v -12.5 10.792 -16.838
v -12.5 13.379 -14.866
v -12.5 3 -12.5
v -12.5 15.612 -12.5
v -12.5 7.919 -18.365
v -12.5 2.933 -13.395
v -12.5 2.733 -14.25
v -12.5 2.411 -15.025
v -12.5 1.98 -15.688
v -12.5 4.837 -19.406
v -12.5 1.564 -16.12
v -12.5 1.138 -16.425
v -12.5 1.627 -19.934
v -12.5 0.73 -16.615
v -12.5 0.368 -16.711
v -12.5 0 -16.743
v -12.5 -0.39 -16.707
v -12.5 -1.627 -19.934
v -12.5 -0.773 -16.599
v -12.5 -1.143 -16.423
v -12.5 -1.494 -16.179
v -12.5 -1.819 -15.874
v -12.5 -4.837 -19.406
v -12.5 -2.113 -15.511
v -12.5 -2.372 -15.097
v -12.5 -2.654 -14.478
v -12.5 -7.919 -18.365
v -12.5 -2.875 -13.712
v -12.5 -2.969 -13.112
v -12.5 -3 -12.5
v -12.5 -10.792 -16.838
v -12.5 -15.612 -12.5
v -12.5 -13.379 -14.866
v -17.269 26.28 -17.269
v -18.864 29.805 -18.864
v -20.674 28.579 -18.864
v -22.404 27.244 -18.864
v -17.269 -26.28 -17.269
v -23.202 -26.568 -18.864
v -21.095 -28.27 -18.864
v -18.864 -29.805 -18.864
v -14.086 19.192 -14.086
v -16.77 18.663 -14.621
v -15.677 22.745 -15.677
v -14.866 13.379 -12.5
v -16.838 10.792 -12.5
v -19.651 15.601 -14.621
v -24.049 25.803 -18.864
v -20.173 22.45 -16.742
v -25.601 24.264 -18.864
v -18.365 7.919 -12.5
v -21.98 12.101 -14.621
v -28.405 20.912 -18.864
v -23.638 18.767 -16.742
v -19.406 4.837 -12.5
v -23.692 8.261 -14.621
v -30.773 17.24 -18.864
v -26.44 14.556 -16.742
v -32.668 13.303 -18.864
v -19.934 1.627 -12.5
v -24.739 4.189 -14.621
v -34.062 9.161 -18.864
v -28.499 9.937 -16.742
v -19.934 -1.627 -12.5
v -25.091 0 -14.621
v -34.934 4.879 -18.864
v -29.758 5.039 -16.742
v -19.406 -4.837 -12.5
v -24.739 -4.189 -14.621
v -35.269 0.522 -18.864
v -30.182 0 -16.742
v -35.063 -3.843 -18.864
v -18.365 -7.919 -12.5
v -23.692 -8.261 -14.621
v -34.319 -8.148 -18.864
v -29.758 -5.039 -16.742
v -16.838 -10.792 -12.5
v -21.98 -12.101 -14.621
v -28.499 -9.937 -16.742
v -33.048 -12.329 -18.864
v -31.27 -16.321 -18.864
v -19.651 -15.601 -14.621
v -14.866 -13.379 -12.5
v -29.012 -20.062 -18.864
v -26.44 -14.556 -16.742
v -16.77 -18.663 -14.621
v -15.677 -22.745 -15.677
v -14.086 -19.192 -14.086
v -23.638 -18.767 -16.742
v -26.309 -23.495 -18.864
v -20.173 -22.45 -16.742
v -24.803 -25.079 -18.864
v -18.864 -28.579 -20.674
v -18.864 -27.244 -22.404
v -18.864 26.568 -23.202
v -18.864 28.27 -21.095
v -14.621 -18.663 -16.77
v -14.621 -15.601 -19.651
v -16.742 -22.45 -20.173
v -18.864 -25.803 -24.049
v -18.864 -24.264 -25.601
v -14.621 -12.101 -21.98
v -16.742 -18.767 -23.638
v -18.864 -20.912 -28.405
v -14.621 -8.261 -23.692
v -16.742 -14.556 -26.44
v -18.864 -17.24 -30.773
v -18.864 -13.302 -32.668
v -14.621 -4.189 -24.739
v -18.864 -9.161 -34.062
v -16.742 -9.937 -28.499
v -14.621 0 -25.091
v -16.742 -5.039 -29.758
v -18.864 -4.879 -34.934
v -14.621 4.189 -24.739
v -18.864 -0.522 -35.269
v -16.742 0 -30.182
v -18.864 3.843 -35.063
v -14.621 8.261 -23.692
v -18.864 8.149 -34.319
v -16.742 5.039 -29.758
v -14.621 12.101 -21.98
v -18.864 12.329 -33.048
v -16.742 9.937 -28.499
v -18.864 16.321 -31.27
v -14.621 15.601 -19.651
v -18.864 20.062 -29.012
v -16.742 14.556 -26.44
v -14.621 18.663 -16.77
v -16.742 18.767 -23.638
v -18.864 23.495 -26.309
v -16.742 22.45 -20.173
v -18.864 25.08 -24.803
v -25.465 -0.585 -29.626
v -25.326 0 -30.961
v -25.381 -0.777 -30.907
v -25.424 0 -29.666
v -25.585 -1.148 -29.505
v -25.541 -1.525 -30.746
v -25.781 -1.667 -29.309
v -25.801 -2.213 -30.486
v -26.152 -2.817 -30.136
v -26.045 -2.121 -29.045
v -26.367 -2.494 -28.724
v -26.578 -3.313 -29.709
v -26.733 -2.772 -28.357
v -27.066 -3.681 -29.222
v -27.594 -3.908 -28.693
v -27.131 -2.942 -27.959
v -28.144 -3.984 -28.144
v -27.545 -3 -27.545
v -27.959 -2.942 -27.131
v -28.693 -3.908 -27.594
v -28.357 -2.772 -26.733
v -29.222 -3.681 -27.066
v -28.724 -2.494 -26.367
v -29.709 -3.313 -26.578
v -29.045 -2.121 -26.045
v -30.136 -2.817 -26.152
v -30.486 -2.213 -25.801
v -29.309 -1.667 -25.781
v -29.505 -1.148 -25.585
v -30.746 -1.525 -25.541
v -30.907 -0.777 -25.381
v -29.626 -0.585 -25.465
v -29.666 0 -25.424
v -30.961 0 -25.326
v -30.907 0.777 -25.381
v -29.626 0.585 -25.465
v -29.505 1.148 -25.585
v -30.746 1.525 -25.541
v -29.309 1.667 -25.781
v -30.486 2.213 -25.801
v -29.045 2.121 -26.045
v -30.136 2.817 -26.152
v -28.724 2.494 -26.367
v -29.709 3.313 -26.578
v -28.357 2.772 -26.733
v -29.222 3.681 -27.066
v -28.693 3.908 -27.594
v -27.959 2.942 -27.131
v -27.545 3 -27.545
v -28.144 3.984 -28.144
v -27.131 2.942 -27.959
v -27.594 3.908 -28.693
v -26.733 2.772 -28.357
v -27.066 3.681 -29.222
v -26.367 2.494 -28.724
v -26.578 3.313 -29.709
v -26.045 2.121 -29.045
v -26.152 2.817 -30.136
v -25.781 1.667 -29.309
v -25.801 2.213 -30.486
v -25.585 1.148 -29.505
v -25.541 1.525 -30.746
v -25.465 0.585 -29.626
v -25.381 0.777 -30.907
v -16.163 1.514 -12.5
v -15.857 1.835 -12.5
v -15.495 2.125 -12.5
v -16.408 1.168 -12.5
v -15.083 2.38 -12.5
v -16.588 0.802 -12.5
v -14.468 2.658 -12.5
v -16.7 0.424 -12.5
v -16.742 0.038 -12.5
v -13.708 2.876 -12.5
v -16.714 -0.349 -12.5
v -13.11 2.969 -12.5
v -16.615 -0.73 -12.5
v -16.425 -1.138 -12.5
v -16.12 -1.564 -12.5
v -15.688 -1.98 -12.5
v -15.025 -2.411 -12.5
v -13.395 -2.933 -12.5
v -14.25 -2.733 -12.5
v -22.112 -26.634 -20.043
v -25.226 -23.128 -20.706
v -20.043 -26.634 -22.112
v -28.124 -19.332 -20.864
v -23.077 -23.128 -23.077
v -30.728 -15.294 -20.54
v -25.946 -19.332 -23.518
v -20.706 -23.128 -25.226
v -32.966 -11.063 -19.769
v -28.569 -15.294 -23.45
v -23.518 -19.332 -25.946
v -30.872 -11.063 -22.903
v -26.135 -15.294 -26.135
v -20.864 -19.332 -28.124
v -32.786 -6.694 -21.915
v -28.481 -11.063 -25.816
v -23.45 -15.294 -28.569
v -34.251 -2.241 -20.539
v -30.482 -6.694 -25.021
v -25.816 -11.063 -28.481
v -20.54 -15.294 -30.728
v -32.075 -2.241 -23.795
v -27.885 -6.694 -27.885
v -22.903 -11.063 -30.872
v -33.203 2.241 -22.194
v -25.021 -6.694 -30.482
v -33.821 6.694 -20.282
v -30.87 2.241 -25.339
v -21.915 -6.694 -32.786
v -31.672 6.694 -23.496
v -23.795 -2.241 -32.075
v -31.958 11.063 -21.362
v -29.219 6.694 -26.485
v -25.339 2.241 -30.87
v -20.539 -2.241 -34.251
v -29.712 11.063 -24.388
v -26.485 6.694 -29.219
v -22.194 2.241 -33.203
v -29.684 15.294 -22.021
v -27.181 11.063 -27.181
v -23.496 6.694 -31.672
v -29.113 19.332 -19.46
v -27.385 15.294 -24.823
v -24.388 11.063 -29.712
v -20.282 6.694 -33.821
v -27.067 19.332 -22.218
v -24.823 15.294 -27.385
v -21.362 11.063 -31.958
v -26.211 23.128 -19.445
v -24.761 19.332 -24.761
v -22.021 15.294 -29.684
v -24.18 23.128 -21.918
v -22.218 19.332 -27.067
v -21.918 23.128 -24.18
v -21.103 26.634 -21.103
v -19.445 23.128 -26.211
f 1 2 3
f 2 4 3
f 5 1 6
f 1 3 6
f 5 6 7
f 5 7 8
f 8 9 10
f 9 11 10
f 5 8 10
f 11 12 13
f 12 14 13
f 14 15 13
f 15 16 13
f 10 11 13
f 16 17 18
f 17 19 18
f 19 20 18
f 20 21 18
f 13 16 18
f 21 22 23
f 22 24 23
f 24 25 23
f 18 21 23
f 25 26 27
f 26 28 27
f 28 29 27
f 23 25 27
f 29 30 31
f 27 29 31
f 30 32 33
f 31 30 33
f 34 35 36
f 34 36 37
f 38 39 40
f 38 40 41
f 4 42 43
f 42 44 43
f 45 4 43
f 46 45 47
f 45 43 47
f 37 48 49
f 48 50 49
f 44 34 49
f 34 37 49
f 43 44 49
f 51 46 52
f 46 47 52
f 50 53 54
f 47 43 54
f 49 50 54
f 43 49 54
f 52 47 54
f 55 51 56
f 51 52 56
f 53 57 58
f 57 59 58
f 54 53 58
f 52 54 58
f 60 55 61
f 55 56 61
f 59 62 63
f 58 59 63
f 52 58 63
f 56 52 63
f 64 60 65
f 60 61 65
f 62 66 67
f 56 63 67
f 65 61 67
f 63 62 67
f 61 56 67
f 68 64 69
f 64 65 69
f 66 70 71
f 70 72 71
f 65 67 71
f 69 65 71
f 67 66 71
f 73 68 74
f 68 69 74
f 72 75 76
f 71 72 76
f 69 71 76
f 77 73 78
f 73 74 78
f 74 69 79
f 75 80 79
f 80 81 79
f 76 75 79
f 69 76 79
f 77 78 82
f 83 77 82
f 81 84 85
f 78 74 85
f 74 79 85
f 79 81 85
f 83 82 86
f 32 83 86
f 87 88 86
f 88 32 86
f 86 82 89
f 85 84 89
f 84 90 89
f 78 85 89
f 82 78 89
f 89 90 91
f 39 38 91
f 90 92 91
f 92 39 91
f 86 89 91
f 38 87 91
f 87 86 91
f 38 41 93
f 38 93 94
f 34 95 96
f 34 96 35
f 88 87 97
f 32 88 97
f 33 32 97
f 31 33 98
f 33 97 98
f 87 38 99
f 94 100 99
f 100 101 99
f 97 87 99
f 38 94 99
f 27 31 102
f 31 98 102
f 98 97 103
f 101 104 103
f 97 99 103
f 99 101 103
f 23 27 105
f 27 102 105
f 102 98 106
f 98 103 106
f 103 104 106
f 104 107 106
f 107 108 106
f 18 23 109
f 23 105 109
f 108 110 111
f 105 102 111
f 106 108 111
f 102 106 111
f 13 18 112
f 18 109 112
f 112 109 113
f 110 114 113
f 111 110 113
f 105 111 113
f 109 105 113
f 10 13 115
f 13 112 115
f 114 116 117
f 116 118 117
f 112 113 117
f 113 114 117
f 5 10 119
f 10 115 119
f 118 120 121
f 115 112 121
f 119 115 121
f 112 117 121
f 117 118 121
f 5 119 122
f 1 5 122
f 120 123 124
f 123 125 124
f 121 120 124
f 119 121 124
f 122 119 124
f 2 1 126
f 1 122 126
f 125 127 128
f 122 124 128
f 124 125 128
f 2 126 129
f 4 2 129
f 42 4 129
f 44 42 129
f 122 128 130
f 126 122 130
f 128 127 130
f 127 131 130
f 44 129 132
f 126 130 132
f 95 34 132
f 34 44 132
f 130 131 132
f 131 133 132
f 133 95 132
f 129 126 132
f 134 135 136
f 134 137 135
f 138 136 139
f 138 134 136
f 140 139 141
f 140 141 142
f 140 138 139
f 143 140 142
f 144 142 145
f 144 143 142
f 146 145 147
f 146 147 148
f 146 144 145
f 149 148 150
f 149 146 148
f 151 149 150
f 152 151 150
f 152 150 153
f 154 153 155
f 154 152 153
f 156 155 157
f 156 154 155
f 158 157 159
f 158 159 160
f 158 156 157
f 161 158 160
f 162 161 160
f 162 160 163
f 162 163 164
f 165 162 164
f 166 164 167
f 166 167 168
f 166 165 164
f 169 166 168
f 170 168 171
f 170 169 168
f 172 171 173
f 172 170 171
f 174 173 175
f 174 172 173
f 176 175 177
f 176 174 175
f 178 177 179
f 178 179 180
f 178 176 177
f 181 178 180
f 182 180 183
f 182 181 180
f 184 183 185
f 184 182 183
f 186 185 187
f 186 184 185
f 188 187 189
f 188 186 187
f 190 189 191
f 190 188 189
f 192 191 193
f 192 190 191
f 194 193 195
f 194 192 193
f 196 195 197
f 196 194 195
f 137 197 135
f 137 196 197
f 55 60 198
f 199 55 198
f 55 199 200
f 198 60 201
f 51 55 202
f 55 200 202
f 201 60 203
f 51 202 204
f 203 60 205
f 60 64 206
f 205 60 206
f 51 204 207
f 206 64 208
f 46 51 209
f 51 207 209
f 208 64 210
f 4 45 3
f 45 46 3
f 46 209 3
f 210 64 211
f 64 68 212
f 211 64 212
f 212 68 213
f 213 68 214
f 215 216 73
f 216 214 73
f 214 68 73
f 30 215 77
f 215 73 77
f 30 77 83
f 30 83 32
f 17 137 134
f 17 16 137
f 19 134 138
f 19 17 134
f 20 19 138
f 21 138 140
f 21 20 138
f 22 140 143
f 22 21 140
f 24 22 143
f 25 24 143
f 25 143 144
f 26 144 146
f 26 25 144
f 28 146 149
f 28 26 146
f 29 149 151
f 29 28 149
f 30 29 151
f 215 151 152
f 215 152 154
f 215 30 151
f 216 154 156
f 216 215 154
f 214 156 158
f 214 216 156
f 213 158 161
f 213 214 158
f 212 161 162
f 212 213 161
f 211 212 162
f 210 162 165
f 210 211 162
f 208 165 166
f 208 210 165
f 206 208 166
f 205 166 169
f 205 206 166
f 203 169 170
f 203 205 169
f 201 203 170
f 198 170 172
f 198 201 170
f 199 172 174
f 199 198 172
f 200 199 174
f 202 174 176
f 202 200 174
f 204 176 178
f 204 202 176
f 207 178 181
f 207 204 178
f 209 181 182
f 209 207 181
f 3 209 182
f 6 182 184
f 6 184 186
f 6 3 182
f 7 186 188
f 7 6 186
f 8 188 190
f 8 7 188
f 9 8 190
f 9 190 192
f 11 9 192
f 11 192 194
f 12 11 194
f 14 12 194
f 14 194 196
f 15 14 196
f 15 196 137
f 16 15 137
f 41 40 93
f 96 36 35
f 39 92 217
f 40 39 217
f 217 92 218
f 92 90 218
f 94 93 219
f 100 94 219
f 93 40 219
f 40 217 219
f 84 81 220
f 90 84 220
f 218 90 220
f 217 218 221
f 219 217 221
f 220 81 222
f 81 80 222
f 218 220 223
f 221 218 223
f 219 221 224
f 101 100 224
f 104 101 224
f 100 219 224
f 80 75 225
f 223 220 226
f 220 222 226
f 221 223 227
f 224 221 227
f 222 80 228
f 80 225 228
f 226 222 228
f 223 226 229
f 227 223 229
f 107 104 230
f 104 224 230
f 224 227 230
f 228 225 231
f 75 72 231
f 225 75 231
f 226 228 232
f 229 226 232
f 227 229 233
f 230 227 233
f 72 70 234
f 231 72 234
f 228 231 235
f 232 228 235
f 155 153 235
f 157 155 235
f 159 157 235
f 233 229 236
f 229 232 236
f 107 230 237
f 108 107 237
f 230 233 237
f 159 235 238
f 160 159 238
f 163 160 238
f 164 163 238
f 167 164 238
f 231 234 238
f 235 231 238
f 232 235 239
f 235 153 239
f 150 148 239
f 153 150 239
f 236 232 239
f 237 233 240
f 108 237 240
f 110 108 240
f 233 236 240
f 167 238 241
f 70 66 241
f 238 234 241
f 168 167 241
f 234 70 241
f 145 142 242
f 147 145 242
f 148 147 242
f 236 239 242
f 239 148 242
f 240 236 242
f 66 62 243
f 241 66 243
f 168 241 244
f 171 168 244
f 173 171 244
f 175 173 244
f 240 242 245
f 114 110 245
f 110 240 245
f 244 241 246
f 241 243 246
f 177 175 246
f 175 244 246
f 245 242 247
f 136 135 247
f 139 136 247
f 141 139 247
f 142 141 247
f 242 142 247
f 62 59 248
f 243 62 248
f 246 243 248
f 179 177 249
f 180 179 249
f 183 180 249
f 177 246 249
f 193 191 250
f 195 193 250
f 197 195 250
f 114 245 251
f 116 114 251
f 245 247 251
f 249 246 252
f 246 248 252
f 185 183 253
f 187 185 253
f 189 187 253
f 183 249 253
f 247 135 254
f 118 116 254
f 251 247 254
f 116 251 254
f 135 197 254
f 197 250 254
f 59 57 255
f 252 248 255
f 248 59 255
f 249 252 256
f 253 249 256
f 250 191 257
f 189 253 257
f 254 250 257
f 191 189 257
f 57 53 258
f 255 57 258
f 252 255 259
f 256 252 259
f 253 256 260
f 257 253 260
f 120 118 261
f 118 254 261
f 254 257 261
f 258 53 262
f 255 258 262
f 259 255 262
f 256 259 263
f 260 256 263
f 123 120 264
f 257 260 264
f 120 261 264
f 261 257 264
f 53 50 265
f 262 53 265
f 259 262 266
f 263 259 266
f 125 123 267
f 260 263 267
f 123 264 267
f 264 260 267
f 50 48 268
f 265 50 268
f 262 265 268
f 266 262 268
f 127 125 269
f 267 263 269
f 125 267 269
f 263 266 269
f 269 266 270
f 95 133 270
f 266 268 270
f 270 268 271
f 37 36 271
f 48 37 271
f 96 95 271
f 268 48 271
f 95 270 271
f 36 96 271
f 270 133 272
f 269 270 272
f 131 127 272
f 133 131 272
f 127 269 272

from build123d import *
from OCP.BRepAlgoAPI import BRepAlgoAPI_Cut
from OCP.TopTools import TopTools_ListOfShape

# Parameters (mm, degrees)
CUT_EXTRUDE_1_DEPTH      = 59.108987417
CUT_EXTRUDE_1_DEPTH_BACK = 59.108987417
CUT_EXTRUDE_2_DEPTH      = 59.108987417
CUT_EXTRUDE_2_DEPTH_BACK = 59.108987417
SKETCH_12_W              = 3
SKETCH_12_H              = 50.62024983


with BuildPart() as part:
    # 草图3 → 旋转1 (revolve)
    with BuildSketch(Plane(origin=(0, 0, 0), x_dir=(0, 0, -1), z_dir=(1, 0, 0))):
        with BuildLine():
            Line((0, 40), (0, -40))
            ThreePointArc((0, -40), (40, 0), (0, 40))
        make_face()
    revolve(axis=Axis((0, 40, 0), (0, -1, 0)))

    # 草图4 → 切除-旋转3 (revolve, cut)
    with BuildSketch(Plane.XY, mode=Mode.PRIVATE) as cut_revolve_3_sk:
        Polygon((-25, 50), (25, 50), (12.5, 20), (-12.5, 20), align=None)
    revolve(cut_revolve_3_sk.sketch.rotate(Axis((-55.247864245, 0, 0), (1, 0, 0)), 90), axis=Axis((-55.247864245, 0, 0), (1, 0, 0)), mode=Mode.SUBTRACT)


with BuildPart() as cut_revolve_4_tool:
    # 草图5 → 切除-旋转4 (revolve)
    with BuildSketch(Plane(origin=(0, 0, 0), x_dir=(1, 0, 0), z_dir=(0, 1, 0))):
        Polygon((-50, 25), (-50, -25), (-20, -12.5), (-20, 12.5), align=None)
    revolve(axis=Axis((0, 0, -44.002313129), (0, 0, 1)))


with BuildPart() as part_1:
    add(part.part)

    # 切除-旋转4: cut by cut_revolve_4_tool, with a tolerance
    cut_revolve_4_stock = TopTools_ListOfShape()
    cut_revolve_4_stock.Append(part_1.part.wrapped)
    cut_revolve_4_tools = TopTools_ListOfShape()
    cut_revolve_4_tools.Append(cut_revolve_4_tool.part.wrapped)
    cut_revolve_4_cut = BRepAlgoAPI_Cut()
    cut_revolve_4_cut.SetArguments(cut_revolve_4_stock)
    cut_revolve_4_cut.SetTools(cut_revolve_4_tools)
    cut_revolve_4_cut.SetFuzzyValue(0.00001)
    cut_revolve_4_cut.Build()
    add(Compound.cast(cut_revolve_4_cut.Shape()).solids(), mode=Mode.REPLACE)

    # 草图6 → 切除-拉伸1 (cut, two sides: drawn at the far end of the back side and taken through both)
    with BuildSketch(Plane(origin=(0, 0, 0), x_dir=(1, 0, 0), z_dir=(0, 1, 0)).offset(-CUT_EXTRUDE_1_DEPTH_BACK)):
        Polygon((-20, 12.5), (37.556288363, 12.5), (37.556288363, -29.25786606), (31.486585193, -38.646938151), (-34.426597666, -38.077903479), (-43.720830645, -12.186825895), align=None)
    extrude(amount=CUT_EXTRUDE_1_DEPTH + CUT_EXTRUDE_1_DEPTH_BACK, mode=Mode.SUBTRACT)

    # 草图7 → 切除-拉伸2 (cut, two sides: drawn at the far end of the back side and taken through both)
    with BuildSketch(Plane(origin=(0, 0, 0), x_dir=(1, 0, 0), z_dir=(0, 1, 0)).offset(-CUT_EXTRUDE_2_DEPTH_BACK)):
        Polygon((-12.5, 20), (-10.113298037, 50.085656358), (42.871589505, 47.227550391), (40.63466159, 5.758348279), (-0.879417221, -1.726674889), (-12.5, 12.5), align=None)
    extrude(amount=CUT_EXTRUDE_2_DEPTH + CUT_EXTRUDE_2_DEPTH_BACK, mode=Mode.SUBTRACT)

    # 草图12 → 切除-旋转7 (revolve, cut)
    with BuildSketch(Plane(origin=(0, 0, 0), x_dir=(0, 1, 0), z_dir=(0.7071067811865464, 0, -0.7071067811865488)), mode=Mode.PRIVATE) as cut_revolve_7_sk:
        with Locations((1.5, -25.310124915)):
            Rectangle(SKETCH_12_W, SKETCH_12_H)
    revolve(cut_revolve_7_sk.sketch.rotate(Axis((0, 0, 0), (-0.7071067811865488, 0, -0.7071067811865464)), 90), axis=Axis((0, 0, 0), (-0.7071067811865488, 0, -0.7071067811865464)), mode=Mode.SUBTRACT)

    # 倒角1
    # the kernel refuses this chamfer: 1, 0.93267614 mm, written as the material it takes off along each edge
    with BuildSketch(Plane(origin=(-28.204609567, 1e-09, -28.204609538), x_dir=(0.7071067811865464, -3.5887694896846076e-10, -0.7071067811865487), z_dir=(2.537647002539835e-10, 1.0, -2.537639482002908e-10))) as chamfer_1_piece_1:
        with BuildLine():
            Line((3.984104251, -0.086249492), (2.999999979, -0.932676176))
            Line((2.999999979, -0.932676176), (3.000000021, 0))
            ThreePointArc((3.000000021, 0), (3.506227368, -0.041308053), (3.984104251, -0.086249492))
        make_face()
    revolve(axis=Axis((-28.204609567, 1e-09, -28.204609538), (-0.7071067811865486, 0, -0.7071067811865465)), mode=Mode.SUBTRACT)


solid = part_1.part
